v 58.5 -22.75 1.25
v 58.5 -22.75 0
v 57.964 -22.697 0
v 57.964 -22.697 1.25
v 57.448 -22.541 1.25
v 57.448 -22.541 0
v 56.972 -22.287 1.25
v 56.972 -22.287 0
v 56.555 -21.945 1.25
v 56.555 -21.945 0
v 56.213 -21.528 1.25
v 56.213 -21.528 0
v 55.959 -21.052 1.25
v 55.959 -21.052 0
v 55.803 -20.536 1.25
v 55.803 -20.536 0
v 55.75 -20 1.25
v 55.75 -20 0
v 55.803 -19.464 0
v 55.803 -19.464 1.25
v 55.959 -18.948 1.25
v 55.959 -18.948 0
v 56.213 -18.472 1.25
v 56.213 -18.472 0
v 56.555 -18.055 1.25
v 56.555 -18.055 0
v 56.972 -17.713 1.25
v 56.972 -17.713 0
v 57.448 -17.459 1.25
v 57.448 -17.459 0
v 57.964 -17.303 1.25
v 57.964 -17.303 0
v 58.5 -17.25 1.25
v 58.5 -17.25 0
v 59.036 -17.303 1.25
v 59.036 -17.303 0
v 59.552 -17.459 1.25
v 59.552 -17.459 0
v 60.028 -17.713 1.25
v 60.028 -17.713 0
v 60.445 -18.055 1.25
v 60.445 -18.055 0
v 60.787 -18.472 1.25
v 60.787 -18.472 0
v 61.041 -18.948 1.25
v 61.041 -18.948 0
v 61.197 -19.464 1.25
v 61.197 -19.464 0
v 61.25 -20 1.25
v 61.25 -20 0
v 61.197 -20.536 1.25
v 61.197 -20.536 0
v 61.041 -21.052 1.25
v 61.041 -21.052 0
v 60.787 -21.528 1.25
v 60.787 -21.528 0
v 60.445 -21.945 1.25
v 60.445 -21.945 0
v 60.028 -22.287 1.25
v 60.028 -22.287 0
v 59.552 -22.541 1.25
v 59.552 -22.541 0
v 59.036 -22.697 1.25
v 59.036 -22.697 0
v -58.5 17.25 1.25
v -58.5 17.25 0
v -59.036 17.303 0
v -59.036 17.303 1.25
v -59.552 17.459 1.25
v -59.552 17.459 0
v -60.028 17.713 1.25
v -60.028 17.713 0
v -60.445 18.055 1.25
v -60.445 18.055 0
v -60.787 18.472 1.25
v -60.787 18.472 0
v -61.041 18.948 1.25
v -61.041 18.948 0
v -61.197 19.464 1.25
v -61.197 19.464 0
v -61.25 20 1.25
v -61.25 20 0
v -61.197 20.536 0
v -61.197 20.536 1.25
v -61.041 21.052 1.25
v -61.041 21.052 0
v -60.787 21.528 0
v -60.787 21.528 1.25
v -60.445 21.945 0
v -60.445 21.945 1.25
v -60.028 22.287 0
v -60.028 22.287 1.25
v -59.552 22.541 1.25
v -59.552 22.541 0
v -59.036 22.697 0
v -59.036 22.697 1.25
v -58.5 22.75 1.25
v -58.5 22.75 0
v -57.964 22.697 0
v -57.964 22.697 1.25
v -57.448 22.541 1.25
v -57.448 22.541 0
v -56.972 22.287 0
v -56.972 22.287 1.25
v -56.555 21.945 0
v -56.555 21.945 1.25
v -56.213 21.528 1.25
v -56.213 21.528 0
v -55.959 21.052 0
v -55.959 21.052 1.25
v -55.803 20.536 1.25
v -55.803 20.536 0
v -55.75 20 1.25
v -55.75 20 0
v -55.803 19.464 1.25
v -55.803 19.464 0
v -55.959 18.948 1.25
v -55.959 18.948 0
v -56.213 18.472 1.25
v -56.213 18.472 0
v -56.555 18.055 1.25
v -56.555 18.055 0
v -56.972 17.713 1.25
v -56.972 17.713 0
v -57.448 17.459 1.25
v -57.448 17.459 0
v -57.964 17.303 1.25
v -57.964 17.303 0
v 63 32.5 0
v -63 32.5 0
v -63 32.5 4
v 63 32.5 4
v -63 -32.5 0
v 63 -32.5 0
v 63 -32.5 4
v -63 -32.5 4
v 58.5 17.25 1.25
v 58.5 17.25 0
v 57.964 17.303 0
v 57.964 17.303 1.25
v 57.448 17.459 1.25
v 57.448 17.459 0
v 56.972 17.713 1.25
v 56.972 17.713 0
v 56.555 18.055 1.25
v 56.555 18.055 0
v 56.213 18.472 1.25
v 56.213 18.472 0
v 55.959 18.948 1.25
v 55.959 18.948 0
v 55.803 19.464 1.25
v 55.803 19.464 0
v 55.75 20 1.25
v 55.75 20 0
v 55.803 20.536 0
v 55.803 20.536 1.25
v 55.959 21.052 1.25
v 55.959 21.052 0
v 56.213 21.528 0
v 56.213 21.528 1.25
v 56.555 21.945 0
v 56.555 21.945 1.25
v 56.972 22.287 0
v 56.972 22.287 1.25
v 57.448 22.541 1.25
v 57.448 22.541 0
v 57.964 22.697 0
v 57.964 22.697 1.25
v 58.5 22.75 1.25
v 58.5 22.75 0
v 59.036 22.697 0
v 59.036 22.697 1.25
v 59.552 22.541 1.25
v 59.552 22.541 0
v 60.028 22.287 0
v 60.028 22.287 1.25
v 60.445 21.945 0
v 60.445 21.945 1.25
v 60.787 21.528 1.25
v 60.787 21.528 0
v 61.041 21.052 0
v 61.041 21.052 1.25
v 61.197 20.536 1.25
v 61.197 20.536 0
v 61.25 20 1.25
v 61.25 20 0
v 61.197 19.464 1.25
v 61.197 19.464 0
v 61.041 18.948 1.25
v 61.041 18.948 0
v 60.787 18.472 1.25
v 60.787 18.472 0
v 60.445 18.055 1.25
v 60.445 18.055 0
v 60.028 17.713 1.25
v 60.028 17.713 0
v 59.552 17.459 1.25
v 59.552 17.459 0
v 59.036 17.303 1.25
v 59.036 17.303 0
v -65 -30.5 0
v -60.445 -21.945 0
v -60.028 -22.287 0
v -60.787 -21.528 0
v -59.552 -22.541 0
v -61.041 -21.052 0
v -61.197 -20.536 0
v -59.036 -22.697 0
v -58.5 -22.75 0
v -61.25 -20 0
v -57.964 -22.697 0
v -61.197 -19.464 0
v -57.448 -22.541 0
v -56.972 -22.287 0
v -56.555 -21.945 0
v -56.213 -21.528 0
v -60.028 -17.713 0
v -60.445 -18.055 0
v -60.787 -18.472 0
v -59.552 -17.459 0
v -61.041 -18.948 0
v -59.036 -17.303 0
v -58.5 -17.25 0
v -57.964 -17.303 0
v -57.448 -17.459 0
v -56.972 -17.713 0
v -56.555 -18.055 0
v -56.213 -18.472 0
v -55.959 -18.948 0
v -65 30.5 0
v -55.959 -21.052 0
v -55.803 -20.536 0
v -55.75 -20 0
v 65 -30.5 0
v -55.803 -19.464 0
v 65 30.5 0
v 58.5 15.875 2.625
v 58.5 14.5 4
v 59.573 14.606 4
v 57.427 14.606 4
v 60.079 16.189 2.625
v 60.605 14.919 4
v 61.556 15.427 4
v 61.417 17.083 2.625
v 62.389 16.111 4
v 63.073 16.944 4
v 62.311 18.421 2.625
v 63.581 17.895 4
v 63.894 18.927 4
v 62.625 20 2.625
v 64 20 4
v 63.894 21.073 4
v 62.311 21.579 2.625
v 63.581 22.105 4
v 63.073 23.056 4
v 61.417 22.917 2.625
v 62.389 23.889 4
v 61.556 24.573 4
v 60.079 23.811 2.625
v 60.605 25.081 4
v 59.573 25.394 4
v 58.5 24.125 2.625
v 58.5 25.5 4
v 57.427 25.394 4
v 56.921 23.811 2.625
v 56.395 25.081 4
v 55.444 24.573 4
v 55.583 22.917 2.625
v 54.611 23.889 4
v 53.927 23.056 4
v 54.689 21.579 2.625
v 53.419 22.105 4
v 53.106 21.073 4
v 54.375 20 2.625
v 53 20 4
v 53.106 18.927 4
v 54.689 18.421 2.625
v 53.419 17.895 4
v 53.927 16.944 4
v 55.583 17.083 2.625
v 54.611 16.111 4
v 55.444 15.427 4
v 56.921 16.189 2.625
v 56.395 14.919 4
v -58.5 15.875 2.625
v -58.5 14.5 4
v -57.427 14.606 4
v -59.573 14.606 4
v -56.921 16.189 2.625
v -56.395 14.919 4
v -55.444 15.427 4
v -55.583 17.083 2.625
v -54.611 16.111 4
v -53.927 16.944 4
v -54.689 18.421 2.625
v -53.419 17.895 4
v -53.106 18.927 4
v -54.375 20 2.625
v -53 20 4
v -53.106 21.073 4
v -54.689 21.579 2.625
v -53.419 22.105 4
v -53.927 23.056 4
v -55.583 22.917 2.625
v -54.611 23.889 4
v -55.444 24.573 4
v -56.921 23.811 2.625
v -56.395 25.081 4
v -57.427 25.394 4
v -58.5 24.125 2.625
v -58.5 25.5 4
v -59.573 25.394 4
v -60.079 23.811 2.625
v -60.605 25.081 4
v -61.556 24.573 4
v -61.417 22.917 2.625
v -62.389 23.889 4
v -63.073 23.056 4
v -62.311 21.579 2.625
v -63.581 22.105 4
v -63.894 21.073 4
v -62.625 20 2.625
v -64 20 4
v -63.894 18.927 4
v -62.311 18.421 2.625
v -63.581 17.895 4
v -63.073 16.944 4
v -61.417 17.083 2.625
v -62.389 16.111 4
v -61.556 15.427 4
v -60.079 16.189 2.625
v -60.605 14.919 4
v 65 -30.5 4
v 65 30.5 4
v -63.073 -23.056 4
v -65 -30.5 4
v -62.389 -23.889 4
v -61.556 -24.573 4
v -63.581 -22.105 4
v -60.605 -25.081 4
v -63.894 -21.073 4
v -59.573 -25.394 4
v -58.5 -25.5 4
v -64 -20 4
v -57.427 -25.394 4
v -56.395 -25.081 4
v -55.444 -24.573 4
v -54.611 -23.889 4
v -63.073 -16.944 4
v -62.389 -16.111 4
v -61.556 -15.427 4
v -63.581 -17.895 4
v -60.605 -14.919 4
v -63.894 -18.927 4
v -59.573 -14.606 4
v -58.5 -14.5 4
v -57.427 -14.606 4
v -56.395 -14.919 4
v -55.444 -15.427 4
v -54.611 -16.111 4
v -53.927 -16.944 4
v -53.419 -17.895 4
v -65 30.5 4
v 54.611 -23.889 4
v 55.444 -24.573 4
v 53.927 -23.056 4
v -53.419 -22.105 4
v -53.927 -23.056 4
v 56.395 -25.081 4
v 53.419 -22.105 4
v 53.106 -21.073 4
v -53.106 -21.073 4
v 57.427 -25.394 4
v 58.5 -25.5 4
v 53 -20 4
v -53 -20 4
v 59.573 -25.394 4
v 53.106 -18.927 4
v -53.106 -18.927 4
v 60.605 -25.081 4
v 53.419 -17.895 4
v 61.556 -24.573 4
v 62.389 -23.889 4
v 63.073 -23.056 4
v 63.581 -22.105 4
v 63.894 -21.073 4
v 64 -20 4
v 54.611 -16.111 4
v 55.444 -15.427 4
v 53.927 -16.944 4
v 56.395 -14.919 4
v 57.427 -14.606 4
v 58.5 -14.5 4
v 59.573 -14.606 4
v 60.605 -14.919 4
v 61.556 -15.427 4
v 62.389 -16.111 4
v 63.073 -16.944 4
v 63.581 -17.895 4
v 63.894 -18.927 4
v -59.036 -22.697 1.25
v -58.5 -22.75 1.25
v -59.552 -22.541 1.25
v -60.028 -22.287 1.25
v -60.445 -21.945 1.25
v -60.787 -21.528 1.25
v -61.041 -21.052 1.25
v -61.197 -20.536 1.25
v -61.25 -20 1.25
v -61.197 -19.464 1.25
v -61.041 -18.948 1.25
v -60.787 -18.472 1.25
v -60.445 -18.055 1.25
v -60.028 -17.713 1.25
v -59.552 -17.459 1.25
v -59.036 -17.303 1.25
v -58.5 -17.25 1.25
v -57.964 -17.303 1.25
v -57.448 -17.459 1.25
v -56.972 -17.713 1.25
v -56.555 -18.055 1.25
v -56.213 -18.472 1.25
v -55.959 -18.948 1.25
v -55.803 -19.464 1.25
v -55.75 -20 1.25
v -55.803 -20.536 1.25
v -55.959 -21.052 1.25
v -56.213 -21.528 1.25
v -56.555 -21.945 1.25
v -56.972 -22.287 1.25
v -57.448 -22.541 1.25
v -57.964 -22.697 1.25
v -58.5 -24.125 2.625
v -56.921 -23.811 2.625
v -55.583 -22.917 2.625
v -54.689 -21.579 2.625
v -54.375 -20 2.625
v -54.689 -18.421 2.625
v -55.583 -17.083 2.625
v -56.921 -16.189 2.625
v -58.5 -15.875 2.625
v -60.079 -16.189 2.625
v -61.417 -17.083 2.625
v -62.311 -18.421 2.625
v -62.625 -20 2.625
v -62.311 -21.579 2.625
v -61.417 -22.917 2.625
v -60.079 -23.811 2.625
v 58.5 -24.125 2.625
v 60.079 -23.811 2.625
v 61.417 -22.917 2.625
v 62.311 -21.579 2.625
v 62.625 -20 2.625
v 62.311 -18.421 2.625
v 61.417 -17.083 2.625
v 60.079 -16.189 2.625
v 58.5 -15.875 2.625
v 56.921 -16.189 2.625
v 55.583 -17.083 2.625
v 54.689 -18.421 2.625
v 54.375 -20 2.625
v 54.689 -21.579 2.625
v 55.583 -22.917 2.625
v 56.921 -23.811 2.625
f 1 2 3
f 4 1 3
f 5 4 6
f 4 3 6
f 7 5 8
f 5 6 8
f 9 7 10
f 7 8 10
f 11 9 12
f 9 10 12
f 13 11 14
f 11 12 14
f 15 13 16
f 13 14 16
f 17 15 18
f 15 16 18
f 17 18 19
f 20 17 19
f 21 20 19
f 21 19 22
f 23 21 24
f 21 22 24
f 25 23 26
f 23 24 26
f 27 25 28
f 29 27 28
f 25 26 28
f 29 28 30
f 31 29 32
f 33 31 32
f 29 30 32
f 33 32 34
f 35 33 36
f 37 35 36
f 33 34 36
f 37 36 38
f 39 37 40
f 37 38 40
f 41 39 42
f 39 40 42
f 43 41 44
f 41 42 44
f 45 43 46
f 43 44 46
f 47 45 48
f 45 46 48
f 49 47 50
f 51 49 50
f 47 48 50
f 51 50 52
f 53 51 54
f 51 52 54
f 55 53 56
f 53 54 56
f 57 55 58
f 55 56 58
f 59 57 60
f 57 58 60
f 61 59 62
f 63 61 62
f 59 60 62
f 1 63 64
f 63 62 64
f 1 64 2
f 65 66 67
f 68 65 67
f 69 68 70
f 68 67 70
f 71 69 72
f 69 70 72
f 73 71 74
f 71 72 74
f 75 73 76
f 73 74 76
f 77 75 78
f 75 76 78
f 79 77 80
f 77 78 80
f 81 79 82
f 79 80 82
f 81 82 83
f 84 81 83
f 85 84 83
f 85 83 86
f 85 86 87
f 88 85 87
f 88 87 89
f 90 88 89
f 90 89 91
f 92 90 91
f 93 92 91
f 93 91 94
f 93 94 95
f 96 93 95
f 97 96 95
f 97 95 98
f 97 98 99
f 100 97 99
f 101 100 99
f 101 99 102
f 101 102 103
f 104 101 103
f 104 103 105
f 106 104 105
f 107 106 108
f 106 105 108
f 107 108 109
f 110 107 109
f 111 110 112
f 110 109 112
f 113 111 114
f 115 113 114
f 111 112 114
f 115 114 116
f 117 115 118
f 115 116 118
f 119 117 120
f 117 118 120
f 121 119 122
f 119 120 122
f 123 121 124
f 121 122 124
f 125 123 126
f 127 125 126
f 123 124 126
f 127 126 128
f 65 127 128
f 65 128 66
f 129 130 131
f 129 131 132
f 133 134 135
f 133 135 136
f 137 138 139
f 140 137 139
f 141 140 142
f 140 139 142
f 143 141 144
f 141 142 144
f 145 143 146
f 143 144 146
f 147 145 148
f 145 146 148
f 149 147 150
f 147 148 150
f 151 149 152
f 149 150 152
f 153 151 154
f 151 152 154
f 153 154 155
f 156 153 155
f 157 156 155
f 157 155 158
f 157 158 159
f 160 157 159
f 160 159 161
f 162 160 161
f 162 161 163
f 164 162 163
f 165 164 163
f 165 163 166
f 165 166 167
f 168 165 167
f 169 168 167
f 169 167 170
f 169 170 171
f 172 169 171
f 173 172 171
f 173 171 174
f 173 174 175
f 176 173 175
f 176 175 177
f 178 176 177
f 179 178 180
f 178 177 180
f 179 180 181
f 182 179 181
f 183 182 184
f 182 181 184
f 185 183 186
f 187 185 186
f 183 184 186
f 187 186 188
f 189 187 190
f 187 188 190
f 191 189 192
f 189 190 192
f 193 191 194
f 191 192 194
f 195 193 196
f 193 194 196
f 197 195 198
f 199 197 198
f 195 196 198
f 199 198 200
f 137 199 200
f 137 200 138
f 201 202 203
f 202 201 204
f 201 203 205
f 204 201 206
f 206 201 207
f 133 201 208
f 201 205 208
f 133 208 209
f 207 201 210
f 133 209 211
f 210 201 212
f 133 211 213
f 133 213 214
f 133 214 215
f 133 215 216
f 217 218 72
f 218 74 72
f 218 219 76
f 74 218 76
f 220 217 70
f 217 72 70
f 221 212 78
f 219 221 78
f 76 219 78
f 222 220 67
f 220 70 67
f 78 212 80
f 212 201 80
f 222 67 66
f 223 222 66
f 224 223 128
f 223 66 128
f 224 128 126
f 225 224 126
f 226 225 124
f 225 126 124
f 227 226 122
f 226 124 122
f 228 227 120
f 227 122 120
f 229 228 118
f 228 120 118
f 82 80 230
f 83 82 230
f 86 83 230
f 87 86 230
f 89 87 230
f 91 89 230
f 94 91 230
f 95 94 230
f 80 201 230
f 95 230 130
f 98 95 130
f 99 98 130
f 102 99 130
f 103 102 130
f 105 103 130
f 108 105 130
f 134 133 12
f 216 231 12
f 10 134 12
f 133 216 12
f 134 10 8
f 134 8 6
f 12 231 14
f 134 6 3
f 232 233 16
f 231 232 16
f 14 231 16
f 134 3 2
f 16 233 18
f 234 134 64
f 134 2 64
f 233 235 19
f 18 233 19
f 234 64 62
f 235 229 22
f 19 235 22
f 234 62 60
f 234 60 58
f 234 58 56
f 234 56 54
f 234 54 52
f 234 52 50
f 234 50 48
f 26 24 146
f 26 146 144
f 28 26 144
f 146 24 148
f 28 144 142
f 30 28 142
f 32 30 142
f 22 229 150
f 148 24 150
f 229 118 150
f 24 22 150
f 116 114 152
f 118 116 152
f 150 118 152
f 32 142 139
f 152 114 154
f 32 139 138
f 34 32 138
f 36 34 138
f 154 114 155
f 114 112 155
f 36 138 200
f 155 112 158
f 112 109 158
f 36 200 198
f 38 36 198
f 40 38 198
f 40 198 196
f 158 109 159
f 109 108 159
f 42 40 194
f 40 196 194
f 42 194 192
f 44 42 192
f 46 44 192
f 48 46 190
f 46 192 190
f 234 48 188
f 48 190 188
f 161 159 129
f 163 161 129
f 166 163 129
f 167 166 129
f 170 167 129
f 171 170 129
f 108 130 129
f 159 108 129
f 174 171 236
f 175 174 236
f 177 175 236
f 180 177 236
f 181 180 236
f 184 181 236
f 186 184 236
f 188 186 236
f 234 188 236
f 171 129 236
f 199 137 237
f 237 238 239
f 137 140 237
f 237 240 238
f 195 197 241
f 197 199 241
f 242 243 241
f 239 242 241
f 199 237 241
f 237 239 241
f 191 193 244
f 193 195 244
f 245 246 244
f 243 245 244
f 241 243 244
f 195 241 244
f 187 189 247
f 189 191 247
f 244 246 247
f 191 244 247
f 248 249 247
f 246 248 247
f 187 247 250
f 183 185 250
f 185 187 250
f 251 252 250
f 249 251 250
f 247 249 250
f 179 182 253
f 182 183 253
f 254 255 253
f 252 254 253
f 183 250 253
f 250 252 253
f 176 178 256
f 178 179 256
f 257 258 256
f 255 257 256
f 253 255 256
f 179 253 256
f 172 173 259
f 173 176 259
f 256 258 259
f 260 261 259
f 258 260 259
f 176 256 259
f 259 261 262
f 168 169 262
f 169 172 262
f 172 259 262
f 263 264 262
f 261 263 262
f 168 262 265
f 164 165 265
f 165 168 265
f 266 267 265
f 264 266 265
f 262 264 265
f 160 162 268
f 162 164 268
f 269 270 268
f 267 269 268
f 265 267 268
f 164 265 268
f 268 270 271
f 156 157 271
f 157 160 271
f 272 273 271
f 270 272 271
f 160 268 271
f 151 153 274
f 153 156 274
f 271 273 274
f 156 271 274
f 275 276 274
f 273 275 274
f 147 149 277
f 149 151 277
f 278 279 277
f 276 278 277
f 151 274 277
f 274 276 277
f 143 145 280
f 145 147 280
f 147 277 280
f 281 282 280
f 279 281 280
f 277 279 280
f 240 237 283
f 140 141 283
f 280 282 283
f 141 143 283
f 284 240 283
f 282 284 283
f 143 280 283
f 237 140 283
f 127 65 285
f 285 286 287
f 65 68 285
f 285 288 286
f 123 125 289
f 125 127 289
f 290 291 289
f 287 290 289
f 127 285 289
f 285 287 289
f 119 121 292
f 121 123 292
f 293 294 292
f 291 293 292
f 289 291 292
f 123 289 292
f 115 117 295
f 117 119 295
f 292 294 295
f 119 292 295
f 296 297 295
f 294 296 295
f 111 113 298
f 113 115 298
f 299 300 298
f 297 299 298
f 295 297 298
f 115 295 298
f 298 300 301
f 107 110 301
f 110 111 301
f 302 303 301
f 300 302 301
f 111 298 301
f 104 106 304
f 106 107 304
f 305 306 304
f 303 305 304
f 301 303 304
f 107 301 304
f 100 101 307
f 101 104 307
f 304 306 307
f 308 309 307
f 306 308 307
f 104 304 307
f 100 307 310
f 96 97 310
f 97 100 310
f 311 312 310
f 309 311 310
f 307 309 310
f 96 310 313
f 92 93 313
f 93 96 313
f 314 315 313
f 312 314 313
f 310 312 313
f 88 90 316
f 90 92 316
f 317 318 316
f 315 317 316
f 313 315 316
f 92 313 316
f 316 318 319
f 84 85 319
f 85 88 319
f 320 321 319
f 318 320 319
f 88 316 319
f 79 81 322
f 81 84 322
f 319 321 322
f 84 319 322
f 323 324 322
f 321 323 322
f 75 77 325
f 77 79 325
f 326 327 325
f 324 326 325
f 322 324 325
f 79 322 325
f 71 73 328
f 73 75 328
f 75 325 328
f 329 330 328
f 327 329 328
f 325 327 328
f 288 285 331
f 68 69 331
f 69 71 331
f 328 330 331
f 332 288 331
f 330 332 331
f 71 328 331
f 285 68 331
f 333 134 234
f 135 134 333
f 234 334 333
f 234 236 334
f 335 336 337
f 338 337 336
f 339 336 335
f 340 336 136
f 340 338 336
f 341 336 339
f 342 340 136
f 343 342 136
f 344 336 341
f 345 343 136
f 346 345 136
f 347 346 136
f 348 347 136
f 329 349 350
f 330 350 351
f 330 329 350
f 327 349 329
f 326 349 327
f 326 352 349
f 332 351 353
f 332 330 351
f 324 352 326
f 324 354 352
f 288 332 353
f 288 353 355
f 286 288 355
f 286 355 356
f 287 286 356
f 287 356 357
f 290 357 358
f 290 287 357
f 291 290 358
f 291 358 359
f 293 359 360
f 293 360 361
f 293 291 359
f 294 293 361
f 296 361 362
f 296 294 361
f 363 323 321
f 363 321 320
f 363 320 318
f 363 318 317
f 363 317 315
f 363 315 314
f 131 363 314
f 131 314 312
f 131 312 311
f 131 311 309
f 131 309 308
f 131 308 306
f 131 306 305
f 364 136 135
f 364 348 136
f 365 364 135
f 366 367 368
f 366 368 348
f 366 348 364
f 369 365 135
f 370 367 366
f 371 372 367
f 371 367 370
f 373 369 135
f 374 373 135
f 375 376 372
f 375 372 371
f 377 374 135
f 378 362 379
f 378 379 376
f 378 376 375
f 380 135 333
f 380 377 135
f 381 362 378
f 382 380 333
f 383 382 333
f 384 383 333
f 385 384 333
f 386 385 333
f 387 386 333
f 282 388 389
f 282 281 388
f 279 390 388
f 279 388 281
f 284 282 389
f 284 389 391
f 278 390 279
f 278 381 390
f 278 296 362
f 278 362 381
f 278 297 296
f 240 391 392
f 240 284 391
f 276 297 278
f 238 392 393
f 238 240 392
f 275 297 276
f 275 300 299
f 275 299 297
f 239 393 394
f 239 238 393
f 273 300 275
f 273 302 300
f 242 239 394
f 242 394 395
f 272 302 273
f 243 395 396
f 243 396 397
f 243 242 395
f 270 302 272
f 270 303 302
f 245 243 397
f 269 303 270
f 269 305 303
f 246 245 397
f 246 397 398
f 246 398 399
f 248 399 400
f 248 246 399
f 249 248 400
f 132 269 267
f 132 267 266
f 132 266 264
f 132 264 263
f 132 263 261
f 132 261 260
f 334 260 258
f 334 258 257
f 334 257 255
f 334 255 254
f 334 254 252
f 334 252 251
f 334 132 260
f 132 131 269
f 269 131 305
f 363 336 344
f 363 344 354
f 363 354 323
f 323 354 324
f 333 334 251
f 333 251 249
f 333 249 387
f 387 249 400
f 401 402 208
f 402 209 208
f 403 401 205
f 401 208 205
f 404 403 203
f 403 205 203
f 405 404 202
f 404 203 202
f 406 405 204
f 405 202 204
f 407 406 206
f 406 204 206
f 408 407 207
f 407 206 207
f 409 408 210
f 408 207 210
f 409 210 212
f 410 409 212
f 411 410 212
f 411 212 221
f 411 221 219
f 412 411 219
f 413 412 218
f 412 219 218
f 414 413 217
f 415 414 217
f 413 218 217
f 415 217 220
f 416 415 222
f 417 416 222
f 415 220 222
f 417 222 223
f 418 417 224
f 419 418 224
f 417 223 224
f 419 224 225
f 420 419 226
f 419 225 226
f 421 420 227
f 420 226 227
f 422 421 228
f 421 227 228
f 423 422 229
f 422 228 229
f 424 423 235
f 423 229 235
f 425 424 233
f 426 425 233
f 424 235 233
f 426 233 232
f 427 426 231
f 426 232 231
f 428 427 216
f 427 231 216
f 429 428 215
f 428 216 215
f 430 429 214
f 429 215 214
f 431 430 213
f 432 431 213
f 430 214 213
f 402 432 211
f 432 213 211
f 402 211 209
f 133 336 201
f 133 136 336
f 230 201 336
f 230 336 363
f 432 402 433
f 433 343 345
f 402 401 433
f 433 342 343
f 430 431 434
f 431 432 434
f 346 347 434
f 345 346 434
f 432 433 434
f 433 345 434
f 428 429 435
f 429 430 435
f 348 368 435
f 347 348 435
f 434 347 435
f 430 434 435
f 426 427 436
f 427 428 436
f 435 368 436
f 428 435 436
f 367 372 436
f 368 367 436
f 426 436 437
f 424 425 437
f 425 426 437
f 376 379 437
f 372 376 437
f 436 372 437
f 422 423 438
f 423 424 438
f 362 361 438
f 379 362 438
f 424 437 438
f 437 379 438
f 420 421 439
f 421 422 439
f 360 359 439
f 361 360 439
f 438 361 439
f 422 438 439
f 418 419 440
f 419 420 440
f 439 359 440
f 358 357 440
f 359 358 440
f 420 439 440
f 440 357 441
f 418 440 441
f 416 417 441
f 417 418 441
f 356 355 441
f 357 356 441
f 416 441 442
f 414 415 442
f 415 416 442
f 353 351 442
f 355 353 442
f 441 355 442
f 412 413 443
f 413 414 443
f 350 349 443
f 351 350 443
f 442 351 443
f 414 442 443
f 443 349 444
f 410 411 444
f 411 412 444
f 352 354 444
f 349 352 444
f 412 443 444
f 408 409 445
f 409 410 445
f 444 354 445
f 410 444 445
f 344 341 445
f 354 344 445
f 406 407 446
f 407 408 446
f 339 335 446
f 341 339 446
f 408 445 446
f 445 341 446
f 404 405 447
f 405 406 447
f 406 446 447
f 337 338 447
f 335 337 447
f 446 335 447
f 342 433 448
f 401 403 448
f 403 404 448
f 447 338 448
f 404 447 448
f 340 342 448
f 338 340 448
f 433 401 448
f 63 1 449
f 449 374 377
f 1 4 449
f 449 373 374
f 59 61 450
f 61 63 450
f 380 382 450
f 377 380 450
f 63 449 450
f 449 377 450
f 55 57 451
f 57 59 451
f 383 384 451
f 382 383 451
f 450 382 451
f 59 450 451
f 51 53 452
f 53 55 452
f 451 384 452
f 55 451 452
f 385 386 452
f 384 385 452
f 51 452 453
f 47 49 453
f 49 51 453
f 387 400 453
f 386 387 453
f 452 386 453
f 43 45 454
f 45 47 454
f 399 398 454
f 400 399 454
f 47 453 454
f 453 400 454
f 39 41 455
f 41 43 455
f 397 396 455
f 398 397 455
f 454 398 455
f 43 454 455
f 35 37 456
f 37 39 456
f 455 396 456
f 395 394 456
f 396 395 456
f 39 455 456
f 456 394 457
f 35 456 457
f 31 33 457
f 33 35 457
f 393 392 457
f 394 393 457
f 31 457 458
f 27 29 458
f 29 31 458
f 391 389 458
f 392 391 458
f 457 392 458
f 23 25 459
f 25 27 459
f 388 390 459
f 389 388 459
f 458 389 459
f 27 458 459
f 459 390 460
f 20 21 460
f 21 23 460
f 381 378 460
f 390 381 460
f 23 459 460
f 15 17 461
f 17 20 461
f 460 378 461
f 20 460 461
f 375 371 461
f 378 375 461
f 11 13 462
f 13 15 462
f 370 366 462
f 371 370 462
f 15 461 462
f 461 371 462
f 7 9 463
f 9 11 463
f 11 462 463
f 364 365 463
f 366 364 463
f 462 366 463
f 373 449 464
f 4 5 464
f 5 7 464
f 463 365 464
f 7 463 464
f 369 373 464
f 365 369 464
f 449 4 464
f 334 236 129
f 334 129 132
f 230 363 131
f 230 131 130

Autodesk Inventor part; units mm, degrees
ref_plane "YZ Plane" through (0, 0, 0) normal (1, 0, 0) x (0, 1, 0)
ref_plane "XZ Plane" through (0, 0, 0) normal (0, 1, 0) x (-1, 0, 0)
ref_plane "XY Plane" through (0, 0, 0) normal (0, 0, 1) x (1, 0, 0)
sketch "Sketch5" plane through (0, 0, 0) normal (0, 0, 1) x (1, 0, 0)
  line L0 (-65, 32.5) -> (65, 32.5)
  line L1 (65, 32.5) -> (65, -32.5)
  line L2 (65, -32.5) -> (-65, -32.5)
  line L3 (-65, -32.5) -> (-65, 32.5)
  point P0 (0, 0)
  point P1 (0, 32.5)
  point P2 (65, 0)
  dimension "d8" = 130
  dimension "d9" = 65
extrude "Extrusion5" add sketch "Sketch5" along normal blind 4
sketch "Sketch6" plane through (0, 0, 4) normal (0, 0, 1) x (1, 0, 0)
  circle A0 centre (-58.5, 20) radius 3
  circle A1 centre (-58.5, -20) radius 3
  circle A2 centre (58.5, 20) radius 3
  circle A3 centre (58.5, -20) radius 3
  point P0 (0, 0)
  point P1 (0, 0)
  dimension "d19" = 117
  dimension "d20" = 58.5
  dimension "d21" = 40
  dimension "d22" = 20
  dimension "d23" = 6
hole "Hole1" at (-58.5, 20, 4) at (58.5, 20, 4) at (58.5, -20, 4) at (-58.5, -20, 4) direction (0, 0, -1) diameter 5.5 end through all countersink diameter 11 countersink angle 90 clearance for "Countersunk Flat Head Screw DIN EN ISO 2009" size "M5" standard "DIN"
chamfer "Chamfer1" distance 2 angle 45 4 edges at (65, 32.5, 2) (65, -32.5, 2) (-65, -32.5, 2) (-65, 32.5, 2)
equation "\"d20\" = 0.5 * d19"
equation "\"d22\" = 0.5 * d21"
properties part number "BC-10024" material "Alumínio 7075"
